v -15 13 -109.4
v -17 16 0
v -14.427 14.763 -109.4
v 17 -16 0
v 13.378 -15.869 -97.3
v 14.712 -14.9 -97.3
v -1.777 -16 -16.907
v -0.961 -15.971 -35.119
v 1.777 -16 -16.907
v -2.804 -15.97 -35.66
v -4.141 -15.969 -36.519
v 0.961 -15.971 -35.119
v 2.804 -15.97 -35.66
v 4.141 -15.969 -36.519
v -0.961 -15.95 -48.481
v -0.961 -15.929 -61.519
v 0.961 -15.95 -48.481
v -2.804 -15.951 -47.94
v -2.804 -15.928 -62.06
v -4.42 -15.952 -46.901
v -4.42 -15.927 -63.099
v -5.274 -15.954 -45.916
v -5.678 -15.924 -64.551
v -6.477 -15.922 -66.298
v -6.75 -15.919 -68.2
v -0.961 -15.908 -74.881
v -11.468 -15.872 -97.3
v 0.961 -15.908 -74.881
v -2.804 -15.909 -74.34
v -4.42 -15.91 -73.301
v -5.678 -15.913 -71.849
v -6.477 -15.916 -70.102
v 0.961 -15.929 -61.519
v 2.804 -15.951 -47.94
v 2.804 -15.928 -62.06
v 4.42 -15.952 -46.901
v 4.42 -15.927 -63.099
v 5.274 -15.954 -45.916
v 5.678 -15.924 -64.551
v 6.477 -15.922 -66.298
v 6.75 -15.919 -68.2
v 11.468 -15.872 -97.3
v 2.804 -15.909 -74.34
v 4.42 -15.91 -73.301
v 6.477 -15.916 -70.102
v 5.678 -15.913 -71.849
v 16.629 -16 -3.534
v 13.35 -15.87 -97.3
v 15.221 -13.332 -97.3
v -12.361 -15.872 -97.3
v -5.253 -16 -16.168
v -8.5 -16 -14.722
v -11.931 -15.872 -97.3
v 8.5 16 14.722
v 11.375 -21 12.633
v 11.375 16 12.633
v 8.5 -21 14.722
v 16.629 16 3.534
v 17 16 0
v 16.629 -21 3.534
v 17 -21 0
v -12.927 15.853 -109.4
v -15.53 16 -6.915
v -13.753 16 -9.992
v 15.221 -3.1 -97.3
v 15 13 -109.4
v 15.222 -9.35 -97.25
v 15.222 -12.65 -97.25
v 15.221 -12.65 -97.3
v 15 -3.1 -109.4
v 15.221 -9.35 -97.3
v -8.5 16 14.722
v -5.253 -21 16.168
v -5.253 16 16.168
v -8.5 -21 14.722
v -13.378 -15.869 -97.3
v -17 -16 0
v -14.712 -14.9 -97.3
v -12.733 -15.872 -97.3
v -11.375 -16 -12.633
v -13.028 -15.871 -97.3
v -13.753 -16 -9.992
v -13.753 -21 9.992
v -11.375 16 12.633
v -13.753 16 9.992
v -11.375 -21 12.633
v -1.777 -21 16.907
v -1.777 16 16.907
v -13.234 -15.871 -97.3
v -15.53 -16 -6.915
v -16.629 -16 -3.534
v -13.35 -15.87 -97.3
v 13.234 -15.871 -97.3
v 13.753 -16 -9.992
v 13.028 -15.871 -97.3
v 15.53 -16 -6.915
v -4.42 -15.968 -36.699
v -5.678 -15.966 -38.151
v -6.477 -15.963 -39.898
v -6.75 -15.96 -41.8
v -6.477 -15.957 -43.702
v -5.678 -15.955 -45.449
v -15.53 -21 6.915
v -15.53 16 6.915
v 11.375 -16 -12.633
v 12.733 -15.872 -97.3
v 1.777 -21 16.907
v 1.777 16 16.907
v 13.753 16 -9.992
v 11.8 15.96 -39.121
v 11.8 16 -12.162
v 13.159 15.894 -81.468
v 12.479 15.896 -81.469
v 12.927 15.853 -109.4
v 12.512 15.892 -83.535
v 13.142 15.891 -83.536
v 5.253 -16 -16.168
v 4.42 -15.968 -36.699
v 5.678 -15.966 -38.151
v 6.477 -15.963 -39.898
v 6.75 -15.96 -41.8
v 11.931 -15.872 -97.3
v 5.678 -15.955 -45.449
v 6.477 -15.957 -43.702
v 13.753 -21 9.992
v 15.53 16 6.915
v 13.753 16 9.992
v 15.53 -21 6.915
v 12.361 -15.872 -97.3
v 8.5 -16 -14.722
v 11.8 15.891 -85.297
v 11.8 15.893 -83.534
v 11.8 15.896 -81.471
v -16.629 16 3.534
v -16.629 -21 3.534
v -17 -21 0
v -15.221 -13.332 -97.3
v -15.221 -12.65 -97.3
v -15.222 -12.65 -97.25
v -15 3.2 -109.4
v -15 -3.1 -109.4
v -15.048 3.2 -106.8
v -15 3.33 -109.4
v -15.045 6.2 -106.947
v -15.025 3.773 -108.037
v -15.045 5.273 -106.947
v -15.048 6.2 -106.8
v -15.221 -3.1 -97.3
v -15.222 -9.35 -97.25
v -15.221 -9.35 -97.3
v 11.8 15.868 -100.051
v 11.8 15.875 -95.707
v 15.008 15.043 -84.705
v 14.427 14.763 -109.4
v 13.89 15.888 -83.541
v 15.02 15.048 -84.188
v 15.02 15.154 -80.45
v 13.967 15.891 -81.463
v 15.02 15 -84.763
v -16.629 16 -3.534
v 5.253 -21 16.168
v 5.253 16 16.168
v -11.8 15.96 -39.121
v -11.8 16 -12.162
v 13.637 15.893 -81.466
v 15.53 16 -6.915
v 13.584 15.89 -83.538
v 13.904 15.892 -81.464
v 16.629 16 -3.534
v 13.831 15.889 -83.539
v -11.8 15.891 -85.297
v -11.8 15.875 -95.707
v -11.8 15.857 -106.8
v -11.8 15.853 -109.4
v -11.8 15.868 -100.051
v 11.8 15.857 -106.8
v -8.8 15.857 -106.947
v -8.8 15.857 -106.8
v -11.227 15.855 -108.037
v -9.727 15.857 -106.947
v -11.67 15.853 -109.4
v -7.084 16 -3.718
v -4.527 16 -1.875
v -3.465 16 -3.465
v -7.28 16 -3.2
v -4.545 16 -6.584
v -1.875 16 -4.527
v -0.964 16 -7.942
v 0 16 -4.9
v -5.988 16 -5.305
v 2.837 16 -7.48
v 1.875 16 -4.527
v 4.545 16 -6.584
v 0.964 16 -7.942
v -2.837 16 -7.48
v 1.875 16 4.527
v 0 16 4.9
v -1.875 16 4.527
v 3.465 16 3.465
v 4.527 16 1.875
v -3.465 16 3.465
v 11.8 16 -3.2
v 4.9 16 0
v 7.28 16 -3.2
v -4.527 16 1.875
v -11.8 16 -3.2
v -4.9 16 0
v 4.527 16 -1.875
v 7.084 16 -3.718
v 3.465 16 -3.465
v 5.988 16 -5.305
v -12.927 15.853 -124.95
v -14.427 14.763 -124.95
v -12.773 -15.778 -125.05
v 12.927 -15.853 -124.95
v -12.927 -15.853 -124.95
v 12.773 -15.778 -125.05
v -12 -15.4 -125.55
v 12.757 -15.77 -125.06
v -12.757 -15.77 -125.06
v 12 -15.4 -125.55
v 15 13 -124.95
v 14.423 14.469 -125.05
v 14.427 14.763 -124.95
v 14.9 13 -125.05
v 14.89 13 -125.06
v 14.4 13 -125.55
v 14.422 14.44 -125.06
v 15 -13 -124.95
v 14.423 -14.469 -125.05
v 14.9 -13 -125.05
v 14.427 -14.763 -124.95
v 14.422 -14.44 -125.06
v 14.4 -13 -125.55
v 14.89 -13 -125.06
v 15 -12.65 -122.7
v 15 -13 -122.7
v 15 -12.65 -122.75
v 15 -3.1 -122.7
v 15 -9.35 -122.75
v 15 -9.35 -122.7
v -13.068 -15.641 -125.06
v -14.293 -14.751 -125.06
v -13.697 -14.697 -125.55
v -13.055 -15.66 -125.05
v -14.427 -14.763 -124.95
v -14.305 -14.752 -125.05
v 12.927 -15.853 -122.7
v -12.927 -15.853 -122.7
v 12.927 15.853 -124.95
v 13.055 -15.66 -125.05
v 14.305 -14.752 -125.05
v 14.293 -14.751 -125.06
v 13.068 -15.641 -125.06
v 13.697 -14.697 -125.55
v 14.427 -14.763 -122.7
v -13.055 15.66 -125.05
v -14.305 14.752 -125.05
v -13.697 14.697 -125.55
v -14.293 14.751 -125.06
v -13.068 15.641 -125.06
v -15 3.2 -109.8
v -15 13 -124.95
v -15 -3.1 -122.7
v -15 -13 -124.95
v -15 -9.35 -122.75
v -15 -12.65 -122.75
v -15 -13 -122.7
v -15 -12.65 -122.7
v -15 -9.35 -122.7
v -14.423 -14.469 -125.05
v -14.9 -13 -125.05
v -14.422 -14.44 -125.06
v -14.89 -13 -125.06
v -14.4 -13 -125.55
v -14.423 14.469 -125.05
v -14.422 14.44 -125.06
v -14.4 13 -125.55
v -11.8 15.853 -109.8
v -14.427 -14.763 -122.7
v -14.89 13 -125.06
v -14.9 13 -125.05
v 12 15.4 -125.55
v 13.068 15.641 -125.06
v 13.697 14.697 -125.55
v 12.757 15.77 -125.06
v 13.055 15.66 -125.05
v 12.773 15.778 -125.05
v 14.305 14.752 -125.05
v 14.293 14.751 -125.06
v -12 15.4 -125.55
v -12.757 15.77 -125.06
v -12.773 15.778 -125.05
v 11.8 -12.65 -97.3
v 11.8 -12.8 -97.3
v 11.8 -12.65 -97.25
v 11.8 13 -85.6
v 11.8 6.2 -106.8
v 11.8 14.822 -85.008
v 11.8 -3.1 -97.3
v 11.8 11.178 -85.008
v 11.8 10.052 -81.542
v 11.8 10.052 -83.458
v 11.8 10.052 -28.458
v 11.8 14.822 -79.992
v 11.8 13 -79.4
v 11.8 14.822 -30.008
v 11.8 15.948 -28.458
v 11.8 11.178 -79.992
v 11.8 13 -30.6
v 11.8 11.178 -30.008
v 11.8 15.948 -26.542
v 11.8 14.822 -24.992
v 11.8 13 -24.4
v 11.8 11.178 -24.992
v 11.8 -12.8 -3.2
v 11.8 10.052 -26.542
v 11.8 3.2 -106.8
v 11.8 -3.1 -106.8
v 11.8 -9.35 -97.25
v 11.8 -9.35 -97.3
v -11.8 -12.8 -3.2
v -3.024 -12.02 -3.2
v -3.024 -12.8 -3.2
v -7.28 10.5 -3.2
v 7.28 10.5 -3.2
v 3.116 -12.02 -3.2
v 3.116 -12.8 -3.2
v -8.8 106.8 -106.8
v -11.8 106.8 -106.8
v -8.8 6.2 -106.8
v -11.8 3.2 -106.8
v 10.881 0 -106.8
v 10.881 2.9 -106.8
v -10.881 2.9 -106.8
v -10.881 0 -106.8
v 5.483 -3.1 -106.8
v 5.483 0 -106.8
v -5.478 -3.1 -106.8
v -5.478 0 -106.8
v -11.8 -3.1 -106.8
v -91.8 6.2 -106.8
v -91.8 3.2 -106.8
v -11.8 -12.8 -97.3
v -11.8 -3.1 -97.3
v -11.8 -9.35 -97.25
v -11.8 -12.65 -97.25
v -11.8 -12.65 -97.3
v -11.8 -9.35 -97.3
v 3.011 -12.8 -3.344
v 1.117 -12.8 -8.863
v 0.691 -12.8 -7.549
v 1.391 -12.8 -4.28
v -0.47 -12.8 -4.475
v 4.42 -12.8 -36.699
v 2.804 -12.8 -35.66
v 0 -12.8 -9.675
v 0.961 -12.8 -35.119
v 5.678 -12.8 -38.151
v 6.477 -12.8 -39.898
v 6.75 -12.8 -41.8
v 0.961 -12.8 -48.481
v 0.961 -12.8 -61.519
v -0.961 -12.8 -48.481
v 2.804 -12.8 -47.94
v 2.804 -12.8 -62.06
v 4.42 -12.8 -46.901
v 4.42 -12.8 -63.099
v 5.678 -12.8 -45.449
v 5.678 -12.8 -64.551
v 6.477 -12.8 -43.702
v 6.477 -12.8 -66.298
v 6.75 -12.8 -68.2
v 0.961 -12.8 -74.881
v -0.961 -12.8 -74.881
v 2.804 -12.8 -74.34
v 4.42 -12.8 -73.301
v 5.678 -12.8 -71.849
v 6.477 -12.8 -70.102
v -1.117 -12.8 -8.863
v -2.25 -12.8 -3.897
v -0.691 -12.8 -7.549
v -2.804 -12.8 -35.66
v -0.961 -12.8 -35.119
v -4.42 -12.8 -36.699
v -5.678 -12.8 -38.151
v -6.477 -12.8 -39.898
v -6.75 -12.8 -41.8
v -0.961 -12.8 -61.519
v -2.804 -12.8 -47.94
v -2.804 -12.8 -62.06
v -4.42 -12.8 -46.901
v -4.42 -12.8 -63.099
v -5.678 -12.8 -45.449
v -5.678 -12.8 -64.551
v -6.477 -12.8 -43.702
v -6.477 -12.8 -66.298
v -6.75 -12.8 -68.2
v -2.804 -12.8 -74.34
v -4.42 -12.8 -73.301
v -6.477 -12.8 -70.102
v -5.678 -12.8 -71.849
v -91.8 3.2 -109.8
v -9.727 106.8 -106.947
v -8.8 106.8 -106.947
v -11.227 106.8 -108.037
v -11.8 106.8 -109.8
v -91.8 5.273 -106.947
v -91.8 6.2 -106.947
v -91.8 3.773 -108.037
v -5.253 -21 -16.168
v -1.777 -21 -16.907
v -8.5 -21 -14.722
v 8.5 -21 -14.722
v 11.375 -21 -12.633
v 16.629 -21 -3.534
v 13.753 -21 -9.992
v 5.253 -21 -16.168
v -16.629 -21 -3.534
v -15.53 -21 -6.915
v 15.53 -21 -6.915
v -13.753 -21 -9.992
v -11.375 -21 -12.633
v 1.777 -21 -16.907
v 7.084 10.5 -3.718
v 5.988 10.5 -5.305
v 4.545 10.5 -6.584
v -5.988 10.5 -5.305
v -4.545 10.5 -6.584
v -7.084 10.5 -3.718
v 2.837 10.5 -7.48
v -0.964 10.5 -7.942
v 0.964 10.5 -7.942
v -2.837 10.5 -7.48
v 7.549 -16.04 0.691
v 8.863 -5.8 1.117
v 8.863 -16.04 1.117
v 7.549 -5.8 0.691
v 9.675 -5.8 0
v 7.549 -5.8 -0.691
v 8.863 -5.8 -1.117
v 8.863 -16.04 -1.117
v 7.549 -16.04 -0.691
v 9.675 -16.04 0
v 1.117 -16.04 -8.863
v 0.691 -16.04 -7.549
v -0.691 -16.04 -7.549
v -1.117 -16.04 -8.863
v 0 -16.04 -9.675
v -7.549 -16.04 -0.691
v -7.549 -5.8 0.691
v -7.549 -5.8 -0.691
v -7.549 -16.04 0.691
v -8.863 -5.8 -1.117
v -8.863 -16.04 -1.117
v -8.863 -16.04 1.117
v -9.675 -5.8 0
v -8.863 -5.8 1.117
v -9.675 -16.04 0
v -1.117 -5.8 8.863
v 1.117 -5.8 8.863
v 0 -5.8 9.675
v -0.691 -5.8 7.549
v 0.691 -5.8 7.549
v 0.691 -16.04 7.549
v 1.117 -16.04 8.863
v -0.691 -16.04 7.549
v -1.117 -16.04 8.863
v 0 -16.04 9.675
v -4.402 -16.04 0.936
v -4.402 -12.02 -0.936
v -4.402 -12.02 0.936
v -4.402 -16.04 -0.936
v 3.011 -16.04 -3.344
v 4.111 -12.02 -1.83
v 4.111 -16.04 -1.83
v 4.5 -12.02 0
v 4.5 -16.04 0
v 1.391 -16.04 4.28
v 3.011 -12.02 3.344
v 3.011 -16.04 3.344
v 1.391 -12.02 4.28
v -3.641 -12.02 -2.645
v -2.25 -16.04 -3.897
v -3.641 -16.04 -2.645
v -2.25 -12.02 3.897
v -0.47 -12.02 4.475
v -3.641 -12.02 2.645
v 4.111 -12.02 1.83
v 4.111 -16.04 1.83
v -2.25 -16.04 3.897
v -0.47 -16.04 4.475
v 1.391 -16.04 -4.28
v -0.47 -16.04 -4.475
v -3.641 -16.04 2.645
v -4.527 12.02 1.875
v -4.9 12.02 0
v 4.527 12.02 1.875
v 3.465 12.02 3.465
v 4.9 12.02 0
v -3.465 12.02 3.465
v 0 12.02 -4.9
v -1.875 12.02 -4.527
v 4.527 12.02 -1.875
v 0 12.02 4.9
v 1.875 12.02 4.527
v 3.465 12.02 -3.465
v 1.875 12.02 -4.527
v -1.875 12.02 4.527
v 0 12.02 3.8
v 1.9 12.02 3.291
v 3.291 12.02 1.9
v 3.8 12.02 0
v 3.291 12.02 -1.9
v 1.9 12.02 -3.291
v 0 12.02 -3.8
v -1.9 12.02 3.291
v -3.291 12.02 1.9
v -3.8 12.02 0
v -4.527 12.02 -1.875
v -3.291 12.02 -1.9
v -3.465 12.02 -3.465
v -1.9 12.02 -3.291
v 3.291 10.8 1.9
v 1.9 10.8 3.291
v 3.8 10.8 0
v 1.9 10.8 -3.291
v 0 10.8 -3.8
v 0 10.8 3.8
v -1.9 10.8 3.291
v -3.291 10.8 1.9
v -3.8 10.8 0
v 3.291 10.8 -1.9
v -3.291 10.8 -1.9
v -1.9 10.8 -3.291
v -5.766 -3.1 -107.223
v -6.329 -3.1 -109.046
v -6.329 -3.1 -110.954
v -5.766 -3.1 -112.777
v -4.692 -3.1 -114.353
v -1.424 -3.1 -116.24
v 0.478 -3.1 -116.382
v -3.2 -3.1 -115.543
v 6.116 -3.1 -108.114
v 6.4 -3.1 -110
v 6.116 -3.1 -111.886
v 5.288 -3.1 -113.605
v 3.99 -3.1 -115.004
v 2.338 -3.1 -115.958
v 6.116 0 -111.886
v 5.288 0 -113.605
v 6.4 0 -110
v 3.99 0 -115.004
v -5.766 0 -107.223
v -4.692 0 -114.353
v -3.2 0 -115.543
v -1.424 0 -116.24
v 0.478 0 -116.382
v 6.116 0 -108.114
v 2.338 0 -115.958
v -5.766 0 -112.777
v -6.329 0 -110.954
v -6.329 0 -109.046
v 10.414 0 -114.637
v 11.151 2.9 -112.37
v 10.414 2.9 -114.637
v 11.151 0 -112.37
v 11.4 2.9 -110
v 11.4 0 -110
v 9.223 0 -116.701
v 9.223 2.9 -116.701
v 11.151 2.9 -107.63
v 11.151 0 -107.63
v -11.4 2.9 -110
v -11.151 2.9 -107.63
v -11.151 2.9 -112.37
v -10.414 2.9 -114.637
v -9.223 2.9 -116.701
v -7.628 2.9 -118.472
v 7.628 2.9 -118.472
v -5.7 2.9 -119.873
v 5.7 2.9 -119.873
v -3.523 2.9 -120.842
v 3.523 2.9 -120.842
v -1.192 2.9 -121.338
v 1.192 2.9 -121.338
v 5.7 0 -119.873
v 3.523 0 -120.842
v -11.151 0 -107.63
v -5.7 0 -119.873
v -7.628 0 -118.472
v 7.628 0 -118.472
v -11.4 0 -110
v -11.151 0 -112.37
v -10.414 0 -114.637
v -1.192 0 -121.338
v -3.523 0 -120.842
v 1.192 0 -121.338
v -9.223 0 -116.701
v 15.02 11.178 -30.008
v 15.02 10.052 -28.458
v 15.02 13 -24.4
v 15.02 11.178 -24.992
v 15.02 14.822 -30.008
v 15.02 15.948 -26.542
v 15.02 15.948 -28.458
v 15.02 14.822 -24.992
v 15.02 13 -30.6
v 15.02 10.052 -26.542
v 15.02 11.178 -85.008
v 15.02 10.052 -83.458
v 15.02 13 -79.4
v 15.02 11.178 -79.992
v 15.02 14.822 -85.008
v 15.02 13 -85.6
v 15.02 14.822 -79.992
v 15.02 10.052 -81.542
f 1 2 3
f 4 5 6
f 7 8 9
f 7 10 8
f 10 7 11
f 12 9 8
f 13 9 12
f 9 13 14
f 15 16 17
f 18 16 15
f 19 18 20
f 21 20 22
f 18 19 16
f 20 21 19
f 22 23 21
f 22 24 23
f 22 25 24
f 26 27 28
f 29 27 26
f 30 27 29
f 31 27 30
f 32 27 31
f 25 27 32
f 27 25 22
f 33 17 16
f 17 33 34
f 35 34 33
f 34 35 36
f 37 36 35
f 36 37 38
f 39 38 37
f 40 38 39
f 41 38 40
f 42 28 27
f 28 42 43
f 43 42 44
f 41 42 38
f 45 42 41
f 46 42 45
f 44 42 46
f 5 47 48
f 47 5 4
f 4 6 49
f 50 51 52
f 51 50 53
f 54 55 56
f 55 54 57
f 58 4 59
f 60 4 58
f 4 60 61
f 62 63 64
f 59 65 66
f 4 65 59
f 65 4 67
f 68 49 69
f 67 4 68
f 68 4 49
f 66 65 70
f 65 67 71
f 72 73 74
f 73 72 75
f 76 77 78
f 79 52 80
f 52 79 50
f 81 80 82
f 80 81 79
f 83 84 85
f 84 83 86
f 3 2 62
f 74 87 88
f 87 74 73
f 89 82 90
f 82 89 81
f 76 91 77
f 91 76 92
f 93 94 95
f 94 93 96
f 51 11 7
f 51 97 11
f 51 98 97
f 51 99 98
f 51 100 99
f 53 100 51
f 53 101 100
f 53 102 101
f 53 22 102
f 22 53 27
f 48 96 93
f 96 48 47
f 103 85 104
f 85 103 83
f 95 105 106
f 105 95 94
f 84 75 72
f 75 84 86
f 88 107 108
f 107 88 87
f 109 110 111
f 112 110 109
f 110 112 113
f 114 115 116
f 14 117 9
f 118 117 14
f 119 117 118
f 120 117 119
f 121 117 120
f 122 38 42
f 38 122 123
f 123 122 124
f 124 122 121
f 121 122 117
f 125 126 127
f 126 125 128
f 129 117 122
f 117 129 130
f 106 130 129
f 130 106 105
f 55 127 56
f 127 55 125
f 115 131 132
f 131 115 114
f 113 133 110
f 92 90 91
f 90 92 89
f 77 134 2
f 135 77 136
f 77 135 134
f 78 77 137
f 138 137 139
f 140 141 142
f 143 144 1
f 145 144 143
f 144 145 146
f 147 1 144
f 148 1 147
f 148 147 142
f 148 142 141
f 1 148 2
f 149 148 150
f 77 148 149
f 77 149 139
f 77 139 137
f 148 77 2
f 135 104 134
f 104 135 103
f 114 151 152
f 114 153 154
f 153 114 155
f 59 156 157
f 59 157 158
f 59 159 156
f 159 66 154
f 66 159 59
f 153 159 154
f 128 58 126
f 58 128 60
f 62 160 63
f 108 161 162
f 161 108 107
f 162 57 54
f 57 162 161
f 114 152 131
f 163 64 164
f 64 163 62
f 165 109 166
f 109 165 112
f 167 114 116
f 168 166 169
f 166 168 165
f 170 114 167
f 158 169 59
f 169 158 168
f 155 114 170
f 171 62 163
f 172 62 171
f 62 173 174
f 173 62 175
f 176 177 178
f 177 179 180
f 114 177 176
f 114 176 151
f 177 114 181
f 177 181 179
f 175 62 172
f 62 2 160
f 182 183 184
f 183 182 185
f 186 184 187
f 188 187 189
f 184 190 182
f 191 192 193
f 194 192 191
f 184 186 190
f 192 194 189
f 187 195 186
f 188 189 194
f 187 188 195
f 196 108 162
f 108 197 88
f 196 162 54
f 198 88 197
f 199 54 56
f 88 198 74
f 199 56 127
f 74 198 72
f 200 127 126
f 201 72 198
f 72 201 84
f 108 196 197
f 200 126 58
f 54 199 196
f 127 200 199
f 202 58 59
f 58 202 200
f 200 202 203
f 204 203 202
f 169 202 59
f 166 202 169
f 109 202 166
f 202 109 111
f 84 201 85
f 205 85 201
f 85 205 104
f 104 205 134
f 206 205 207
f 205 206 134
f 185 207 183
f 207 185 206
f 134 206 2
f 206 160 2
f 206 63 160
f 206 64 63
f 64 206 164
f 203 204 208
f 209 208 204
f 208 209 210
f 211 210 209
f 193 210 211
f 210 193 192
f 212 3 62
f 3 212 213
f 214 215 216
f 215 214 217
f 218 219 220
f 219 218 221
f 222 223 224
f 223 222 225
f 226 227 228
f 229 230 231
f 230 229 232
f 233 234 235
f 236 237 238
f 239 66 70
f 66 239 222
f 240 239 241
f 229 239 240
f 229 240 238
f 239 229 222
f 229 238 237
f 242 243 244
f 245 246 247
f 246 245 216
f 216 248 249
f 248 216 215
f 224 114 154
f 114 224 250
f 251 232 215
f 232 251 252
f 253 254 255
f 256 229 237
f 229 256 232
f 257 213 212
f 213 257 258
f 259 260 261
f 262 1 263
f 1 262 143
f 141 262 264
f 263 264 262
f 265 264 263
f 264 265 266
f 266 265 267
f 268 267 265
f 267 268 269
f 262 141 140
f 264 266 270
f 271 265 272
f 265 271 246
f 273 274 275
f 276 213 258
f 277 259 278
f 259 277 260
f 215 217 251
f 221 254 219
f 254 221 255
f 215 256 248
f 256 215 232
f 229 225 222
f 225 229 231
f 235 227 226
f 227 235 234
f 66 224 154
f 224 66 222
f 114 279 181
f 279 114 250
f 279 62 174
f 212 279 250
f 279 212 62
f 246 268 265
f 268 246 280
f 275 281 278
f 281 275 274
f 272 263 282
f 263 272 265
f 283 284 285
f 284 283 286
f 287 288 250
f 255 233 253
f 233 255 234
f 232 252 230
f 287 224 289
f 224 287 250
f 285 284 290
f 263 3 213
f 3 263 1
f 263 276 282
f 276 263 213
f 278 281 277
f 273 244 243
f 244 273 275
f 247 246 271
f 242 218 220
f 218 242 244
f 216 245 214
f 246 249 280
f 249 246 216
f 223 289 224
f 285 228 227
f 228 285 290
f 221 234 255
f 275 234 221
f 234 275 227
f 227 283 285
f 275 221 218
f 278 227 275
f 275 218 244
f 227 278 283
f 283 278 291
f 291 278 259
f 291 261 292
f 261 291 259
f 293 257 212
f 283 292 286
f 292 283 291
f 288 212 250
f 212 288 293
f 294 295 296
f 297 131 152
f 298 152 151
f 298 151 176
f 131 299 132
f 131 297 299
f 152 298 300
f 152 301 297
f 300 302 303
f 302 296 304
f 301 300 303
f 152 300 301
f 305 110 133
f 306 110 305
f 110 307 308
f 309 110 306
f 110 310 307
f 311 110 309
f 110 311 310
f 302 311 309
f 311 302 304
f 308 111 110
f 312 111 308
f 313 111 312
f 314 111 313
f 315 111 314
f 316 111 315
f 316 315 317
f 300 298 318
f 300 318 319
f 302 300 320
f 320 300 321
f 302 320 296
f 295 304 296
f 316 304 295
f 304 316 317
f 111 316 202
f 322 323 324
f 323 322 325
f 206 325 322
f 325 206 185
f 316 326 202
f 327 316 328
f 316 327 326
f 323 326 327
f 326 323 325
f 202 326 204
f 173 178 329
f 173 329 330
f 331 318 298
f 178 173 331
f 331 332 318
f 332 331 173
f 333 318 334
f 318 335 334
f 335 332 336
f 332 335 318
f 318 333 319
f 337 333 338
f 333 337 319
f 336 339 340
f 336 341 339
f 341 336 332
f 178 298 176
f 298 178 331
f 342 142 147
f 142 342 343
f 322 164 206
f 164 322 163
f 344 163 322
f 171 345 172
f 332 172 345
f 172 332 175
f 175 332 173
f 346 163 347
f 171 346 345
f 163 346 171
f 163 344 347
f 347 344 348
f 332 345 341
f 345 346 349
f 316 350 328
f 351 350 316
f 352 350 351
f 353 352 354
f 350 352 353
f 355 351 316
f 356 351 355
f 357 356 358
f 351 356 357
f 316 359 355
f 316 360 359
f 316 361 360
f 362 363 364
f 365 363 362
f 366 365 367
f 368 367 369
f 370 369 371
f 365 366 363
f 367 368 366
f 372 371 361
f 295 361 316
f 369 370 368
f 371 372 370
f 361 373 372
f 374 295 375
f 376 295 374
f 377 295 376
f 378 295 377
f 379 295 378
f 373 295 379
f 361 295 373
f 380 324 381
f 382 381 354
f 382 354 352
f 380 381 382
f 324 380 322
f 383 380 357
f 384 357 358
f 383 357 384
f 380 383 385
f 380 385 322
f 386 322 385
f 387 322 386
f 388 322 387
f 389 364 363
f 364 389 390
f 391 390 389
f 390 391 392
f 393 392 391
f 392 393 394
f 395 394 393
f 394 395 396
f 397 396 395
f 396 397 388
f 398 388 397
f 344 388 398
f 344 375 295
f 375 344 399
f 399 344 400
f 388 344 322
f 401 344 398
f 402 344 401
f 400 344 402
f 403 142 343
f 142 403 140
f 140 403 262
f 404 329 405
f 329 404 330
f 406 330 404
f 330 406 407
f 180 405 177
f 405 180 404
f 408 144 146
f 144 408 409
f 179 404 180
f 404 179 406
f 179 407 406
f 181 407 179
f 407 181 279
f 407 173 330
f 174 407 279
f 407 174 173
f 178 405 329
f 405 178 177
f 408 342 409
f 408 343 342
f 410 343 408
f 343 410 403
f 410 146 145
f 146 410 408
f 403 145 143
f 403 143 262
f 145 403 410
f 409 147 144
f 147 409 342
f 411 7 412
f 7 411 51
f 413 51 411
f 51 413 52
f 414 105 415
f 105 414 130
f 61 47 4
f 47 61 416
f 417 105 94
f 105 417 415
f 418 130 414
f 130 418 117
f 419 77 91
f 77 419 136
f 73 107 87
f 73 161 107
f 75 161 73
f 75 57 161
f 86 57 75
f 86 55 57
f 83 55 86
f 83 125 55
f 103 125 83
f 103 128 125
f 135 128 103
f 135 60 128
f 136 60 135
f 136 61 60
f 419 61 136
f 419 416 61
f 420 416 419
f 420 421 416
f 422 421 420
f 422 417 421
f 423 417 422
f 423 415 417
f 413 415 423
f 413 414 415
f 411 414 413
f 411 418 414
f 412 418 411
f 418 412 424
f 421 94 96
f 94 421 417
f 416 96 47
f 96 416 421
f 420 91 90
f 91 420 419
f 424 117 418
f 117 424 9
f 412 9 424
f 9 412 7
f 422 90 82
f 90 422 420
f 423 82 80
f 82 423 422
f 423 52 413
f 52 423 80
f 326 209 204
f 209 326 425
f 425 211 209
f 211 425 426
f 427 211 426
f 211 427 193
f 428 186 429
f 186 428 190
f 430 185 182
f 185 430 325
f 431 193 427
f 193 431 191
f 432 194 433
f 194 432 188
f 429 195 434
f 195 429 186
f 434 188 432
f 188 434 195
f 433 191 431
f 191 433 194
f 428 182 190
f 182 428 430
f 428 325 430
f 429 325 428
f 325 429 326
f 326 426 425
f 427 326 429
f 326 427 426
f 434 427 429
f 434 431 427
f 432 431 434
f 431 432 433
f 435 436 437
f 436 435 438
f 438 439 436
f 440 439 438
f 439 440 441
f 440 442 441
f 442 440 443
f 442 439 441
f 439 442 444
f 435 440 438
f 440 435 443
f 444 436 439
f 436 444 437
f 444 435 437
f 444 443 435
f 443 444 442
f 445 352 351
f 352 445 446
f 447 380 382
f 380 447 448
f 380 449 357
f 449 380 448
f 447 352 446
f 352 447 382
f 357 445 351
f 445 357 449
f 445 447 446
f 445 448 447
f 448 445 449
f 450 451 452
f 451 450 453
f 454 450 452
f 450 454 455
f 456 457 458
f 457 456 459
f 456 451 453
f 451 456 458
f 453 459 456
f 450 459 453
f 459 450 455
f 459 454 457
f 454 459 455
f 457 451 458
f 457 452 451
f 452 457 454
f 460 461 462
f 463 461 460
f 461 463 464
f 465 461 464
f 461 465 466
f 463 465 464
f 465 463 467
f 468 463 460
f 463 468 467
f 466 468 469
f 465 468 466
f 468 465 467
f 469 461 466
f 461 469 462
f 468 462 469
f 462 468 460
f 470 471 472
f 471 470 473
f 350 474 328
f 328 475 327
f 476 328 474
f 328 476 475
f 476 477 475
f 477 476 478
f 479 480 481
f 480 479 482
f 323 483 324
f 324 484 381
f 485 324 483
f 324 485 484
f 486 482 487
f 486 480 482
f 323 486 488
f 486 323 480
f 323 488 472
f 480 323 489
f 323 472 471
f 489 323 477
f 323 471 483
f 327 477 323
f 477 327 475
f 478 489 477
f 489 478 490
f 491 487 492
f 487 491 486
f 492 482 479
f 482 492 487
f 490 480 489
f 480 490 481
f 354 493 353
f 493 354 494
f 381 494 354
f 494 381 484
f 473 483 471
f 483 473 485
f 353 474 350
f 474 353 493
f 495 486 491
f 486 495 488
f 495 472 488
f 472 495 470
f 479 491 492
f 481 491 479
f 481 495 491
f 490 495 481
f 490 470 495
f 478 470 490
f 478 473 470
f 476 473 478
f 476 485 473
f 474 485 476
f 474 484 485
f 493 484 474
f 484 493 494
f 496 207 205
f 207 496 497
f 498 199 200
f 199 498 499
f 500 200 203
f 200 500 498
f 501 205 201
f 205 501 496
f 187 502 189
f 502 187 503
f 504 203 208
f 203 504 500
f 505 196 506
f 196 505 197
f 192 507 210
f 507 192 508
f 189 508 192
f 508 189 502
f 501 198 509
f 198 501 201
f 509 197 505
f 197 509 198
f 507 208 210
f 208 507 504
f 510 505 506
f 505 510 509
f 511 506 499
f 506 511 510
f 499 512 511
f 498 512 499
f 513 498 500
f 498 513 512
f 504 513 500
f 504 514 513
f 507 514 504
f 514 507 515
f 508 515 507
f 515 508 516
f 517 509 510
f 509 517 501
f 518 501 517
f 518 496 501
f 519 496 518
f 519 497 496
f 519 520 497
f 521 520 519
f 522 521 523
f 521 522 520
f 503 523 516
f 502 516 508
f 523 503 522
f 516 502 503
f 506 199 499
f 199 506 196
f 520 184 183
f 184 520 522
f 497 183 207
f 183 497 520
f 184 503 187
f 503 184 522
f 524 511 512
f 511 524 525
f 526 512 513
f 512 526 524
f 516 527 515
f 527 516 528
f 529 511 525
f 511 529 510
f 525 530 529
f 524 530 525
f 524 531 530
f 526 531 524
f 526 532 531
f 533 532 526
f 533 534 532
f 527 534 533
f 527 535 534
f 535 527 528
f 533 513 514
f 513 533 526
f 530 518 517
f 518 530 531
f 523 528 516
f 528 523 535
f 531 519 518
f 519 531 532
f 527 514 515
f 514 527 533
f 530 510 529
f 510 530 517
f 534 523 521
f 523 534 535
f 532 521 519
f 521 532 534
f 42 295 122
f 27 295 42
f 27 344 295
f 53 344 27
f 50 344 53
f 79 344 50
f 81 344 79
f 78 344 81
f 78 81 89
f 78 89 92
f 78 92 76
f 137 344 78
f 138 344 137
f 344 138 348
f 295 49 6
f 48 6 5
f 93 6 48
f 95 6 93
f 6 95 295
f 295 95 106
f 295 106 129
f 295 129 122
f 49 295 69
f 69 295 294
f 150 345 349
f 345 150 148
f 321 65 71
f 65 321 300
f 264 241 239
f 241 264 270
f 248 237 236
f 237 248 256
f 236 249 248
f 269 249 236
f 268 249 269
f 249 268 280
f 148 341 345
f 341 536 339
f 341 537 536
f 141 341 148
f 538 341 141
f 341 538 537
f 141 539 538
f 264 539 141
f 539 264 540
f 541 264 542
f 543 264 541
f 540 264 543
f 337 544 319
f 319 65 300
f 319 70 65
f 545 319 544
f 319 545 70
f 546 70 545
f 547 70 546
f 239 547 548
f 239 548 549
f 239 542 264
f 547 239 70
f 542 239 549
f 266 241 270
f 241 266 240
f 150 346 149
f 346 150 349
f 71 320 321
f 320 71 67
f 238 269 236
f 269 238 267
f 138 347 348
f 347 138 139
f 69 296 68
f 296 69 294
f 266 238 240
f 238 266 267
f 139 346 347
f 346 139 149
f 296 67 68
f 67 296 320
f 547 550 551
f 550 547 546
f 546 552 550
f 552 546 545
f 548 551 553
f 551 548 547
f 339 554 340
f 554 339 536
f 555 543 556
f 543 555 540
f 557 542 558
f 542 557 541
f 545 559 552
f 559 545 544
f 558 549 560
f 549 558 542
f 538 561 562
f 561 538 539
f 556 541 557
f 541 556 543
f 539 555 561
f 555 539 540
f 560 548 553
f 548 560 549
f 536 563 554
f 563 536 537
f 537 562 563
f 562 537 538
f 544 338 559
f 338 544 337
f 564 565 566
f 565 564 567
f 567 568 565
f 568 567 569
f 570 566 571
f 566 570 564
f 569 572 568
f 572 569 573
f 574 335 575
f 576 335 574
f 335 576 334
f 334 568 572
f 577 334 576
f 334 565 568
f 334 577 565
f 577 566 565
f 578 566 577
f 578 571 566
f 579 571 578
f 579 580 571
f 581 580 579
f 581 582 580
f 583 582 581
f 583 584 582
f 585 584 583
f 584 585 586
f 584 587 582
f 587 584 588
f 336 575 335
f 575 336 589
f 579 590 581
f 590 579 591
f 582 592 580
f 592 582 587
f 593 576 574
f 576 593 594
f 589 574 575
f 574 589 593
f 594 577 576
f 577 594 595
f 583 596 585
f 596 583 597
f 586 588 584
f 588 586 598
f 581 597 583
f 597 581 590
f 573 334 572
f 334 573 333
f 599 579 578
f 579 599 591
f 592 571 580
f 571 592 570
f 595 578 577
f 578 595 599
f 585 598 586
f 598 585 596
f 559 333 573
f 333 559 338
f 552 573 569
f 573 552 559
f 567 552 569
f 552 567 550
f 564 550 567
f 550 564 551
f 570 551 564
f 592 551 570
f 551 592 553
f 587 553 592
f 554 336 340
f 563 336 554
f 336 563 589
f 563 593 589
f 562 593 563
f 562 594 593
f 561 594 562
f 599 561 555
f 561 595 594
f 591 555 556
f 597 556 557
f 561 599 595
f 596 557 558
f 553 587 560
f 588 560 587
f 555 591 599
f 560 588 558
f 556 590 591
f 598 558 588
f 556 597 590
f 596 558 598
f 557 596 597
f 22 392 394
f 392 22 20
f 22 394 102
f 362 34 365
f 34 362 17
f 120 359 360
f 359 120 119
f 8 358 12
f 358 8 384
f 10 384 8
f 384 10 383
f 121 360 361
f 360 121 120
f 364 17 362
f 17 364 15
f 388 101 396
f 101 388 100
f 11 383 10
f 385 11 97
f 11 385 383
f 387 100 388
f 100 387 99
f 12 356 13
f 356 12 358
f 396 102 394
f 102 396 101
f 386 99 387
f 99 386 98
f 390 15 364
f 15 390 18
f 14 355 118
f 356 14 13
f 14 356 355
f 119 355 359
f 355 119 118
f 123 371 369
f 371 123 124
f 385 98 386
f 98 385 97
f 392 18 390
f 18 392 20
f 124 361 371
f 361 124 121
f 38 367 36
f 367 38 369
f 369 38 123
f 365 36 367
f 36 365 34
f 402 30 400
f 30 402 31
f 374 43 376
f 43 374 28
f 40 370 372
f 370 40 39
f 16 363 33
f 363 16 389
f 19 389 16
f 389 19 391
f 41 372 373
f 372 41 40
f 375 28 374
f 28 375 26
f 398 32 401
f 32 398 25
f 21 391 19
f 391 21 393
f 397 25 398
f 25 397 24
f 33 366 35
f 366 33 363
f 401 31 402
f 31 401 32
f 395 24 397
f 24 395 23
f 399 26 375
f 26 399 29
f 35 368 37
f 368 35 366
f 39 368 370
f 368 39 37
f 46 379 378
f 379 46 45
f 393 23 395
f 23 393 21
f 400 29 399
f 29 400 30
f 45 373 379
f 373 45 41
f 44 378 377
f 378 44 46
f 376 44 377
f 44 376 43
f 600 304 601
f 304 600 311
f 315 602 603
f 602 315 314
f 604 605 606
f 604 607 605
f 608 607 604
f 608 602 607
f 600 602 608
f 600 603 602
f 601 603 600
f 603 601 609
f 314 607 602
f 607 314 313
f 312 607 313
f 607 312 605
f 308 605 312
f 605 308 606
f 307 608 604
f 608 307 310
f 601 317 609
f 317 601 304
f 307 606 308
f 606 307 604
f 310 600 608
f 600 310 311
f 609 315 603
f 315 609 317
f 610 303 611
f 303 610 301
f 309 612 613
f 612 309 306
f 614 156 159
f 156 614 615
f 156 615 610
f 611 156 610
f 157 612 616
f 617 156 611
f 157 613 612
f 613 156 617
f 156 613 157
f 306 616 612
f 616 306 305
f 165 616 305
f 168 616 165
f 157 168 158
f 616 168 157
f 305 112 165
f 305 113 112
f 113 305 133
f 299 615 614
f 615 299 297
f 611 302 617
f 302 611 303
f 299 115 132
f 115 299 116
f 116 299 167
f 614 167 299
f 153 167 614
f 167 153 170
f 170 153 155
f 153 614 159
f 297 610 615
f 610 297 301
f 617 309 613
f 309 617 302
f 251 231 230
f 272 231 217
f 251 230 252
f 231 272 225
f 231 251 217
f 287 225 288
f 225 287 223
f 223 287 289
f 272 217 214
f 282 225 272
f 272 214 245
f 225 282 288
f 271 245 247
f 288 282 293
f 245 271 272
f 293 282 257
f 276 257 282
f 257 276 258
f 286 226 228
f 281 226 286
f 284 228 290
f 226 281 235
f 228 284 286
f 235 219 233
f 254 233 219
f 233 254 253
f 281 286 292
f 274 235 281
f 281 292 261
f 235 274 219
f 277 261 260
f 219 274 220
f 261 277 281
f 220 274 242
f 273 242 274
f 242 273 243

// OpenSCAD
// file: ../lib/derived_gen.scad
// GENERATED by `python -m bestiary.robots.whelp.export`. DO NOT EDIT.
//
// Every number here comes from spec.py, which carries its provenance, or from
// geometry.py, which derives it. check.py fails if regenerating this file changes
// it, so a hand edit here is not merely discouraged -- it is caught.
//
// To change a dimension: edit spec.py, re-run export, commit both.


// The SOLVED standing stance. Not typed -- geometry.solve_stance_knee()
// puts the wheel axle directly under the hip pivot, which makes the hip's
// static holding torque exactly zero. The URDF is generated from this same
// call, so the assembly preview and the simulation cannot drift apart.

STANCE_ABDUCT = 0;   // rad
STANCE_HIP    = 0.46;
STANCE_KNEE   = -0.97019;
STANCE_ABDUCT_DEG = 0;
STANCE_HIP_DEG    = 26.356059;
STANCE_KNEE_DEG   = -55.587783;

AXLE_DROP     = 185.830956;   // hip pivot -> axle, mm
KNEE_LEVER    = 48.834292;
STAND_HEIGHT  = 229.430956;
WHEEL_CENTRE_Y = 89;
LOADED_WHEEL_R = 43.6;

// Leg placement: [x sign, y sign] per leg, in FL FR RL RR order.
LEG_SIGNS = [[1, 1], [1, -1], [-1, 1], [-1, -1]];
LEG_NAMES = ["FL", "FR", "RL", "RR"];
// file: ../lib/params_gen.scad
// GENERATED by `python -m bestiary.robots.whelp.export`. DO NOT EDIT.
//
// Every number here comes from spec.py, which carries its provenance, or from
// geometry.py, which derives it. check.py fails if regenerating this file changes
// it, so a hand edit here is not merely discouraged -- it is caught.
//
// To change a dimension: edit spec.py, re-run export, commit both.


// 73 constants,
// spec = whelp16, servo = STS3215-C018, material = PETG

TRUNK_L = 250;
TRUNK_W = 104;
TRUNK_H = 58;
TRUNK_WALL = 2.4;
TRUNK_LAP = 26;
ABDUCT_X = 92;
ABDUCT_Y = 36;
ABDUCT_TO_HIP = 36;
ABDUCT_TO_HIP_DROP = 0;
THIGH_L = 110;
CALF_L = 100;
WHEEL_R = 45;
WHEEL_W = 24;
CALF_TO_WHEEL_PLANE = 17;
THIGH_D = 30;
THIGH_WID = 32;
THIGH_WALL = 3.2;
CALF_D = 26;
CALF_WID = 24;
CALF_WALL = 3.2;
FILLET_R = 3;
SERVO_BODY_L = 45.2;
SERVO_BODY_W = 24.7;
SERVO_BODY_H = 35;
SERVO_HORN_BOLT_CIRCLE_D = 17;
SERVO_HORN_BOLT_COUNT = 4;
SERVO_HORN_BOLT_D = 2;
SERVO_HORN_D = 22;
SERVO_HORN_THICK = 2.5;
HORN_BOSS_THICK = 5;
SERVO_HORN_FACE_TO_BODY = 3.5;
SERVO_HORN_HUB_CLEAR_D = 9;
SERVO_HORN_HUB_CLEAR_H = 4;
SERVO_MOUNT_HOLE_DX = 38;
SERVO_MOUNT_HOLE_DY = 18;
SERVO_EAR_SPAN_L = 54;
SERVO_EAR_THICK = 2.5;
SERVO_EAR_Z_FROM_BODY_MID = 10;
SERVO_HAS_REAR_BOSS = true;
SERVO_REAR_BOSS_D = 6;
SERVO_REAR_BOSS_H = 2;
SERVO_OUTPUT_BOSS_D = 12;
SERVO_CABLE_D = 5;
SERVO_CABLE_INSET = 6;
SERVO_CABLE_STUB = 18;
INSERT_BORE = 4.2;
INSERT_OD = 4.6;
INSERT_L = 5.7;
INSERT_WALL = 1.8;
M3_CLEAR = 3.4;
M3_HEAD_D = 5.5;
M3_HEAD_H = 3;
M3_NUT_AF = 5.5;
M3_NUT_T = 2.4;
IDLER_BEARING_ID = 3;
IDLER_BEARING_OD = 10;
IDLER_BEARING_W = 4;
IDLER_BEARING_SHELF = 1.2;
BEARING_PRESS_FIT = -0.2;
TIRE_T = 12;
FUSE_T = 2;
FUSE_SHEAR_AREA = 10;
FUSE_ENABLE = true;
BED_X = 220;
BED_Y = 220;
BED_Z = 240;
NOZZLE = 0.4;
LAYER = 0.2;
FN = 64;

// Derived clearances (nominal thread + printing allowance).
SERVO_MOUNT_SCREW_CLEAR_D = 2.9;
SERVO_MOUNT_SCREW_HEAD_D = 5;
SERVO_MOUNT_SCREW_HEAD_H = 2.5;
SERVO_HORN_BOLT_CLEAR_D = 2.35;
// main file
// thigh.scad — hip axis to knee axis. One module: thigh().
//
// FRAME. Origin AT THE HIP AXIS, which runs along Y. The leg extends along -Z,
// so the KNEE AXIS is at (0, 0, -THIGH_L) exactly. Authored for the LEFT side;
// build.scad mirrors it for the right, so one printed geometry serves all four.
//
// FORM. A U-channel THIGH_D deep (fore-aft, X) by THIGH_WID wide (lateral, Y),
// walls THIGH_WALL, opening toward +Y (outboard). Depth is in the bending plane
// and bending stiffness goes as depth CUBED, which is the entire reason this is
// a channel and not a plate: at 30 mm deep it is an order of magnitude stiffer
// than a 10 mm plate of the same mass. The open side is also where the knee
// servo drops in, so structure and assembly access are one feature.
//
// PRINT ORIENTATION: lying down, long axis in the bed's XY plane, channel
// opening UP. Then the sagittal bending stress -- the load this part carries
// every step -- runs along the extrusion lines rather than across the layers.
// Nothing in the part overhangs more than 45 degrees in that orientation: the
// channel's interior corners are coved, the bearing bore is a teardrop, and the
// knee cradle's roof is open to the same +Y face the channel is.
//
// WHAT THE THIGH OWES THE TWO JOINTS
// ----------------------------------
// At the HIP end it is DRIVEN: the hip servo's horn bolts to a pad on the -Y
// (inboard) face, and an idler bearing on the +Y face rides the servo's rear
// boss. Two supports, so the servo's own output bushing never sees the leg's
// bending moment -- which is what stops the joint developing the play that
// becomes backlash that becomes a policy which cannot repeat itself.
//
// At the KNEE end it is the MOUNT: the knee servo's BODY bolts here and travels
// with the thigh. That is the direction that matters for the mass model -- a
// servo belongs to the link it is bolted to, not the one it drives -- and
// massmodel.LINK_PARTS says the same thing in Python.

include <../lib/params_gen.scad>
include <../lib/derived_gen.scad>
use <../lib/util.scad>
use <../lib/sts3215.scad>

EPS = 0.02;

// ── Local numbers. Anything params_gen.scad does not carry ───────────────────
HORN_PAD_D   = THIGH_D + 4;              // horn pad diameter at the hip end
BEAR_BOSS_D  = IDLER_BEARING_OD + 6;     // meat around the bearing pocket
CRADLE_H     = SERVO_BODY_W + 2 * THIGH_WALL;   // knee-servo cradle height
WINDOW_D     = THIGH_D * 0.45;           // lightening windows, on the neutral axis
WINDOW_Z     = [-THIGH_L * 0.38, -THIGH_L * 0.62];
CABLE_CLIP_Z = [-THIGH_L * 0.25, -THIGH_L * 0.75];

// Render-time asserts, so a regenerated params_gen.scad cannot quietly
// invalidate the numbers above. A parametric part that silently stops being
// printable when a dimension moves is worse than one that refuses to render.
module thigh_checks() {
    assert(THIGH_WID >= SERVO_BODY_W + 2 * THIGH_WALL,
           str("thigh channel ", THIGH_WID, " mm cannot straddle a ", SERVO_BODY_W,
               " mm servo case with ", THIGH_WALL, " mm walls"));
    assert(HORN_PAD_D / 2 >= SERVO_HORN_BOLT_CIRCLE_D / 2 + SERVO_HORN_BOLT_D,
           str("horn pad ", HORN_PAD_D, " mm is too small for a ",
               SERVO_HORN_BOLT_CIRCLE_D, " mm bolt circle"));
    assert(WINDOW_D + 2 * FILLET_R <= THIGH_D,
           str("lightening window ", WINDOW_D, " mm leaves no ligament in a ",
               THIGH_D, " mm section"));
    assert(THIGH_L + CRADLE_H <= BED_X,
           str("thigh ", THIGH_L + CRADLE_H, " mm does not fit a ", BED_X, " mm bed"));
}

// ── The channel ──────────────────────────────────────────────────────────────

// Outer envelope: the beam, plus the hip-end hub, plus the knee-end cradle,
// hulled so there is no step anywhere along the load path. A step in a bending
// member is a stress concentration in exactly the place the section is already
// working hardest.
module thigh_outer() {
    hull() {
        translate([0, 0, -THIGH_L / 2])
            rounded_plate(THIGH_D, THIGH_WID, THIGH_L, r = FILLET_R, c = 0.6);
        // Hip-end hub: round, because the joint is round and a square corner
        // here would be the crack starter closest to the highest moment.
        rotate([90, 0, 0]) cylinder(d = HORN_PAD_D, h = THIGH_WID, center = true);
    }
    // Knee-end cradle. Not hulled into the beam above: it is deliberately
    // squarer, because the servo case it holds is square and a round pocket in a
    // round boss wastes the wall thickness the mounting screws need.
    translate([0, 0, -THIGH_L])
        rounded_plate(THIGH_D, THIGH_WID, CRADLE_H, r = FILLET_R, c = 0.6);
}

// The cavity, open to +Y. `grow` lets the same profile be used for the coving
// pass, so the inner corners cannot drift out of agreement with the wall.
module thigh_cavity(grow = 0) {
    g = grow;
    translate([0, THIGH_WALL / 2 + g / 2, -THIGH_L / 2])
        cube([THIGH_D - 2 * THIGH_WALL + 2 * g,
              THIGH_WID - THIGH_WALL + g,
              THIGH_L - 2 * THIGH_WALL + 2 * g], center = true);
}

// Coves along the four internal corners of the channel.
//
// FILLET_R everywhere it fits, which is the cheapest strength in the design: a
// 0.3 mm as-modelled corner has a stress concentration factor near 3.0 in
// bending, a 3 mm radius near 1.5. It costs no mass and no print time, and
// skipping it roughly halves fatigue life at the same nominal stress -- while
// costing only ~8% of STATIC strength, which is why static testing makes
// notches look harmless and why this is filleted rather than measured.
module thigh_coves() {
    for (sx = [-1, 1])
        translate([sx * (THIGH_D / 2 - THIGH_WALL), THIGH_WALL, -THIGH_L + THIGH_WALL])
            rotate([0, 0, sx > 0 ? 90 : 0])
                rotate([-90, 0, 0])
                    fillet_in(FILLET_R, THIGH_L - 2 * THIGH_WALL);
}

// ── Joint interfaces ─────────────────────────────────────────────────────────

// Hip end. Horn pad and bolt pattern on -Y; bearing pocket on +Y, coaxial.
//
// The pad is a raised boss rather than a flat face so the horn seats on a
// machined-flat area that is not also the channel wall, and so HORN_BOSS_THICK
// of plastic backs each bolt. That thickness is load-bearing: torque arrives as
// a force on each screw shank BEARING against printed plastic, and bearing area
// is diameter times thickness. Thin bosses do not shear the steel screws, they
// oval out -- and an ovalled bolt hole is exactly the backlash the bearing on
// the far side was fitted to prevent.
module thigh_hip_solid() {
    translate([0, -THIGH_WID / 2, 0])
        rotate([90, 0, 0])
            cylinder(d = HORN_PAD_D, h = HORN_BOSS_THICK);
    translate([0, THIGH_WID / 2 - IDLER_BEARING_W - 1.5, 0])
        rotate([-90, 0, 0])
            cylinder(d = BEAR_BOSS_D, h = IDLER_BEARING_W + 1.5);
}

module thigh_hip_cuts() {
    // Horn bolts, from the inboard face inward.
    translate([0, -THIGH_WID / 2 - EPS, 0])
        rotate([-90, 0, 0])
            sts3215_horn_holes(HORN_BOSS_THICK + THIGH_WALL + 2);
    // Idler bearing pocket, opening outboard. bearing_pocket() carries the
    // interference: BEARING_PRESS_FIT is negative, i.e. the pocket is undersize,
    // because a printed hole comes out undersize by roughly the inward pull of
    // one extrusion and a nominal bore is a bore the race falls out of.
    translate([0, THIGH_WID / 2 + EPS, 0])
        rotate([90, 0, 0])
            bearing_pocket(IDLER_BEARING_OD, IDLER_BEARING_W, BEARING_PRESS_FIT,
                           shelf = IDLER_BEARING_SHELF,
                           bore_clear = IDLER_BEARING_ID + 1);
}

// Knee end. The servo's BODY sits here; its output axis must land exactly on
// (0, 0, -THIGH_L) or the URDF and the plastic disagree about where the knee is.
module thigh_knee_cuts() {
    translate([0, 0, -THIGH_L])
        rotate([-90, 0, 0]) {
            // The pocket, from the servo's own solid plus clearance. Derived
            // from the same module the assembly preview draws, so a corrected
            // case dimension moves both at once.
            sts3215_body(0.4);
            // The harness has to leave without being pinched by the calf's
            // sweep. A serial-bus servo has a cable at BOTH ends, and a leg
            // that pinches one takes the whole bus down, not one joint.
            sts3215_cable_envelope();
            // Case screws.
            sts3215_mount_holes(THIGH_WALL + CRADLE_H + 2);
        }
}

// ── Lightening and cable management ──────────────────────────────────────────

// Windows through the web, on the neutral axis. Removing material where the
// bending stress is zero costs almost no stiffness and buys real mass -- and on
// a 2.2 kg machine where 40% is servos, the structure is where grams come from.
//
// Teardrops, not circles: these are horizontal holes in the print orientation,
// and a circular horizontal hole has a roof that goes fully flat at the top,
// sags into the bore, and leaves a rough undersize hole. Here that only costs
// appearance; the same mistake at the bearing bore would cost the fit.
module thigh_windows() {
    for (z = WINDOW_Z)
        translate([0, THIGH_WID / 2 + EPS, z])
            rotate([90, 0, 0])
                teardrop(WINDOW_D, THIGH_WID + 2 * EPS);
}

// Retention slots for the bus harness along the outboard face. Two cables run
// past this link (the knee servo's and the wheel drive's daisy chain), and an
// unretained loom is a loom that finds the wheel.
module thigh_cable_clips() {
    for (z = CABLE_CLIP_Z)
        translate([THIGH_D / 2 - THIGH_WALL / 2, THIGH_WID / 2 - 3, z])
            rotate([0, 90, 0])
                teardrop(SERVO_CABLE_D + 1.2, THIGH_WALL + 2 * EPS, center = true);
}

// ── The part ─────────────────────────────────────────────────────────────────
module thigh() {
    thigh_checks();
    difference() {
        union() {
            difference() {
                thigh_outer();
                thigh_cavity();
            }
            thigh_coves();
            thigh_hip_solid();
        }
        thigh_hip_cuts();
        thigh_knee_cuts();
        thigh_windows();
        thigh_cable_clips();
        // Bottom-face squish relief, so the printed face seats flat against the
        // knee servo rather than rocking on an elephant foot.
        translate([0, 0, -THIGH_L - CRADLE_H / 2])
            elephant_relief(THIGH_D, THIGH_WID);
    }
}

thigh();
